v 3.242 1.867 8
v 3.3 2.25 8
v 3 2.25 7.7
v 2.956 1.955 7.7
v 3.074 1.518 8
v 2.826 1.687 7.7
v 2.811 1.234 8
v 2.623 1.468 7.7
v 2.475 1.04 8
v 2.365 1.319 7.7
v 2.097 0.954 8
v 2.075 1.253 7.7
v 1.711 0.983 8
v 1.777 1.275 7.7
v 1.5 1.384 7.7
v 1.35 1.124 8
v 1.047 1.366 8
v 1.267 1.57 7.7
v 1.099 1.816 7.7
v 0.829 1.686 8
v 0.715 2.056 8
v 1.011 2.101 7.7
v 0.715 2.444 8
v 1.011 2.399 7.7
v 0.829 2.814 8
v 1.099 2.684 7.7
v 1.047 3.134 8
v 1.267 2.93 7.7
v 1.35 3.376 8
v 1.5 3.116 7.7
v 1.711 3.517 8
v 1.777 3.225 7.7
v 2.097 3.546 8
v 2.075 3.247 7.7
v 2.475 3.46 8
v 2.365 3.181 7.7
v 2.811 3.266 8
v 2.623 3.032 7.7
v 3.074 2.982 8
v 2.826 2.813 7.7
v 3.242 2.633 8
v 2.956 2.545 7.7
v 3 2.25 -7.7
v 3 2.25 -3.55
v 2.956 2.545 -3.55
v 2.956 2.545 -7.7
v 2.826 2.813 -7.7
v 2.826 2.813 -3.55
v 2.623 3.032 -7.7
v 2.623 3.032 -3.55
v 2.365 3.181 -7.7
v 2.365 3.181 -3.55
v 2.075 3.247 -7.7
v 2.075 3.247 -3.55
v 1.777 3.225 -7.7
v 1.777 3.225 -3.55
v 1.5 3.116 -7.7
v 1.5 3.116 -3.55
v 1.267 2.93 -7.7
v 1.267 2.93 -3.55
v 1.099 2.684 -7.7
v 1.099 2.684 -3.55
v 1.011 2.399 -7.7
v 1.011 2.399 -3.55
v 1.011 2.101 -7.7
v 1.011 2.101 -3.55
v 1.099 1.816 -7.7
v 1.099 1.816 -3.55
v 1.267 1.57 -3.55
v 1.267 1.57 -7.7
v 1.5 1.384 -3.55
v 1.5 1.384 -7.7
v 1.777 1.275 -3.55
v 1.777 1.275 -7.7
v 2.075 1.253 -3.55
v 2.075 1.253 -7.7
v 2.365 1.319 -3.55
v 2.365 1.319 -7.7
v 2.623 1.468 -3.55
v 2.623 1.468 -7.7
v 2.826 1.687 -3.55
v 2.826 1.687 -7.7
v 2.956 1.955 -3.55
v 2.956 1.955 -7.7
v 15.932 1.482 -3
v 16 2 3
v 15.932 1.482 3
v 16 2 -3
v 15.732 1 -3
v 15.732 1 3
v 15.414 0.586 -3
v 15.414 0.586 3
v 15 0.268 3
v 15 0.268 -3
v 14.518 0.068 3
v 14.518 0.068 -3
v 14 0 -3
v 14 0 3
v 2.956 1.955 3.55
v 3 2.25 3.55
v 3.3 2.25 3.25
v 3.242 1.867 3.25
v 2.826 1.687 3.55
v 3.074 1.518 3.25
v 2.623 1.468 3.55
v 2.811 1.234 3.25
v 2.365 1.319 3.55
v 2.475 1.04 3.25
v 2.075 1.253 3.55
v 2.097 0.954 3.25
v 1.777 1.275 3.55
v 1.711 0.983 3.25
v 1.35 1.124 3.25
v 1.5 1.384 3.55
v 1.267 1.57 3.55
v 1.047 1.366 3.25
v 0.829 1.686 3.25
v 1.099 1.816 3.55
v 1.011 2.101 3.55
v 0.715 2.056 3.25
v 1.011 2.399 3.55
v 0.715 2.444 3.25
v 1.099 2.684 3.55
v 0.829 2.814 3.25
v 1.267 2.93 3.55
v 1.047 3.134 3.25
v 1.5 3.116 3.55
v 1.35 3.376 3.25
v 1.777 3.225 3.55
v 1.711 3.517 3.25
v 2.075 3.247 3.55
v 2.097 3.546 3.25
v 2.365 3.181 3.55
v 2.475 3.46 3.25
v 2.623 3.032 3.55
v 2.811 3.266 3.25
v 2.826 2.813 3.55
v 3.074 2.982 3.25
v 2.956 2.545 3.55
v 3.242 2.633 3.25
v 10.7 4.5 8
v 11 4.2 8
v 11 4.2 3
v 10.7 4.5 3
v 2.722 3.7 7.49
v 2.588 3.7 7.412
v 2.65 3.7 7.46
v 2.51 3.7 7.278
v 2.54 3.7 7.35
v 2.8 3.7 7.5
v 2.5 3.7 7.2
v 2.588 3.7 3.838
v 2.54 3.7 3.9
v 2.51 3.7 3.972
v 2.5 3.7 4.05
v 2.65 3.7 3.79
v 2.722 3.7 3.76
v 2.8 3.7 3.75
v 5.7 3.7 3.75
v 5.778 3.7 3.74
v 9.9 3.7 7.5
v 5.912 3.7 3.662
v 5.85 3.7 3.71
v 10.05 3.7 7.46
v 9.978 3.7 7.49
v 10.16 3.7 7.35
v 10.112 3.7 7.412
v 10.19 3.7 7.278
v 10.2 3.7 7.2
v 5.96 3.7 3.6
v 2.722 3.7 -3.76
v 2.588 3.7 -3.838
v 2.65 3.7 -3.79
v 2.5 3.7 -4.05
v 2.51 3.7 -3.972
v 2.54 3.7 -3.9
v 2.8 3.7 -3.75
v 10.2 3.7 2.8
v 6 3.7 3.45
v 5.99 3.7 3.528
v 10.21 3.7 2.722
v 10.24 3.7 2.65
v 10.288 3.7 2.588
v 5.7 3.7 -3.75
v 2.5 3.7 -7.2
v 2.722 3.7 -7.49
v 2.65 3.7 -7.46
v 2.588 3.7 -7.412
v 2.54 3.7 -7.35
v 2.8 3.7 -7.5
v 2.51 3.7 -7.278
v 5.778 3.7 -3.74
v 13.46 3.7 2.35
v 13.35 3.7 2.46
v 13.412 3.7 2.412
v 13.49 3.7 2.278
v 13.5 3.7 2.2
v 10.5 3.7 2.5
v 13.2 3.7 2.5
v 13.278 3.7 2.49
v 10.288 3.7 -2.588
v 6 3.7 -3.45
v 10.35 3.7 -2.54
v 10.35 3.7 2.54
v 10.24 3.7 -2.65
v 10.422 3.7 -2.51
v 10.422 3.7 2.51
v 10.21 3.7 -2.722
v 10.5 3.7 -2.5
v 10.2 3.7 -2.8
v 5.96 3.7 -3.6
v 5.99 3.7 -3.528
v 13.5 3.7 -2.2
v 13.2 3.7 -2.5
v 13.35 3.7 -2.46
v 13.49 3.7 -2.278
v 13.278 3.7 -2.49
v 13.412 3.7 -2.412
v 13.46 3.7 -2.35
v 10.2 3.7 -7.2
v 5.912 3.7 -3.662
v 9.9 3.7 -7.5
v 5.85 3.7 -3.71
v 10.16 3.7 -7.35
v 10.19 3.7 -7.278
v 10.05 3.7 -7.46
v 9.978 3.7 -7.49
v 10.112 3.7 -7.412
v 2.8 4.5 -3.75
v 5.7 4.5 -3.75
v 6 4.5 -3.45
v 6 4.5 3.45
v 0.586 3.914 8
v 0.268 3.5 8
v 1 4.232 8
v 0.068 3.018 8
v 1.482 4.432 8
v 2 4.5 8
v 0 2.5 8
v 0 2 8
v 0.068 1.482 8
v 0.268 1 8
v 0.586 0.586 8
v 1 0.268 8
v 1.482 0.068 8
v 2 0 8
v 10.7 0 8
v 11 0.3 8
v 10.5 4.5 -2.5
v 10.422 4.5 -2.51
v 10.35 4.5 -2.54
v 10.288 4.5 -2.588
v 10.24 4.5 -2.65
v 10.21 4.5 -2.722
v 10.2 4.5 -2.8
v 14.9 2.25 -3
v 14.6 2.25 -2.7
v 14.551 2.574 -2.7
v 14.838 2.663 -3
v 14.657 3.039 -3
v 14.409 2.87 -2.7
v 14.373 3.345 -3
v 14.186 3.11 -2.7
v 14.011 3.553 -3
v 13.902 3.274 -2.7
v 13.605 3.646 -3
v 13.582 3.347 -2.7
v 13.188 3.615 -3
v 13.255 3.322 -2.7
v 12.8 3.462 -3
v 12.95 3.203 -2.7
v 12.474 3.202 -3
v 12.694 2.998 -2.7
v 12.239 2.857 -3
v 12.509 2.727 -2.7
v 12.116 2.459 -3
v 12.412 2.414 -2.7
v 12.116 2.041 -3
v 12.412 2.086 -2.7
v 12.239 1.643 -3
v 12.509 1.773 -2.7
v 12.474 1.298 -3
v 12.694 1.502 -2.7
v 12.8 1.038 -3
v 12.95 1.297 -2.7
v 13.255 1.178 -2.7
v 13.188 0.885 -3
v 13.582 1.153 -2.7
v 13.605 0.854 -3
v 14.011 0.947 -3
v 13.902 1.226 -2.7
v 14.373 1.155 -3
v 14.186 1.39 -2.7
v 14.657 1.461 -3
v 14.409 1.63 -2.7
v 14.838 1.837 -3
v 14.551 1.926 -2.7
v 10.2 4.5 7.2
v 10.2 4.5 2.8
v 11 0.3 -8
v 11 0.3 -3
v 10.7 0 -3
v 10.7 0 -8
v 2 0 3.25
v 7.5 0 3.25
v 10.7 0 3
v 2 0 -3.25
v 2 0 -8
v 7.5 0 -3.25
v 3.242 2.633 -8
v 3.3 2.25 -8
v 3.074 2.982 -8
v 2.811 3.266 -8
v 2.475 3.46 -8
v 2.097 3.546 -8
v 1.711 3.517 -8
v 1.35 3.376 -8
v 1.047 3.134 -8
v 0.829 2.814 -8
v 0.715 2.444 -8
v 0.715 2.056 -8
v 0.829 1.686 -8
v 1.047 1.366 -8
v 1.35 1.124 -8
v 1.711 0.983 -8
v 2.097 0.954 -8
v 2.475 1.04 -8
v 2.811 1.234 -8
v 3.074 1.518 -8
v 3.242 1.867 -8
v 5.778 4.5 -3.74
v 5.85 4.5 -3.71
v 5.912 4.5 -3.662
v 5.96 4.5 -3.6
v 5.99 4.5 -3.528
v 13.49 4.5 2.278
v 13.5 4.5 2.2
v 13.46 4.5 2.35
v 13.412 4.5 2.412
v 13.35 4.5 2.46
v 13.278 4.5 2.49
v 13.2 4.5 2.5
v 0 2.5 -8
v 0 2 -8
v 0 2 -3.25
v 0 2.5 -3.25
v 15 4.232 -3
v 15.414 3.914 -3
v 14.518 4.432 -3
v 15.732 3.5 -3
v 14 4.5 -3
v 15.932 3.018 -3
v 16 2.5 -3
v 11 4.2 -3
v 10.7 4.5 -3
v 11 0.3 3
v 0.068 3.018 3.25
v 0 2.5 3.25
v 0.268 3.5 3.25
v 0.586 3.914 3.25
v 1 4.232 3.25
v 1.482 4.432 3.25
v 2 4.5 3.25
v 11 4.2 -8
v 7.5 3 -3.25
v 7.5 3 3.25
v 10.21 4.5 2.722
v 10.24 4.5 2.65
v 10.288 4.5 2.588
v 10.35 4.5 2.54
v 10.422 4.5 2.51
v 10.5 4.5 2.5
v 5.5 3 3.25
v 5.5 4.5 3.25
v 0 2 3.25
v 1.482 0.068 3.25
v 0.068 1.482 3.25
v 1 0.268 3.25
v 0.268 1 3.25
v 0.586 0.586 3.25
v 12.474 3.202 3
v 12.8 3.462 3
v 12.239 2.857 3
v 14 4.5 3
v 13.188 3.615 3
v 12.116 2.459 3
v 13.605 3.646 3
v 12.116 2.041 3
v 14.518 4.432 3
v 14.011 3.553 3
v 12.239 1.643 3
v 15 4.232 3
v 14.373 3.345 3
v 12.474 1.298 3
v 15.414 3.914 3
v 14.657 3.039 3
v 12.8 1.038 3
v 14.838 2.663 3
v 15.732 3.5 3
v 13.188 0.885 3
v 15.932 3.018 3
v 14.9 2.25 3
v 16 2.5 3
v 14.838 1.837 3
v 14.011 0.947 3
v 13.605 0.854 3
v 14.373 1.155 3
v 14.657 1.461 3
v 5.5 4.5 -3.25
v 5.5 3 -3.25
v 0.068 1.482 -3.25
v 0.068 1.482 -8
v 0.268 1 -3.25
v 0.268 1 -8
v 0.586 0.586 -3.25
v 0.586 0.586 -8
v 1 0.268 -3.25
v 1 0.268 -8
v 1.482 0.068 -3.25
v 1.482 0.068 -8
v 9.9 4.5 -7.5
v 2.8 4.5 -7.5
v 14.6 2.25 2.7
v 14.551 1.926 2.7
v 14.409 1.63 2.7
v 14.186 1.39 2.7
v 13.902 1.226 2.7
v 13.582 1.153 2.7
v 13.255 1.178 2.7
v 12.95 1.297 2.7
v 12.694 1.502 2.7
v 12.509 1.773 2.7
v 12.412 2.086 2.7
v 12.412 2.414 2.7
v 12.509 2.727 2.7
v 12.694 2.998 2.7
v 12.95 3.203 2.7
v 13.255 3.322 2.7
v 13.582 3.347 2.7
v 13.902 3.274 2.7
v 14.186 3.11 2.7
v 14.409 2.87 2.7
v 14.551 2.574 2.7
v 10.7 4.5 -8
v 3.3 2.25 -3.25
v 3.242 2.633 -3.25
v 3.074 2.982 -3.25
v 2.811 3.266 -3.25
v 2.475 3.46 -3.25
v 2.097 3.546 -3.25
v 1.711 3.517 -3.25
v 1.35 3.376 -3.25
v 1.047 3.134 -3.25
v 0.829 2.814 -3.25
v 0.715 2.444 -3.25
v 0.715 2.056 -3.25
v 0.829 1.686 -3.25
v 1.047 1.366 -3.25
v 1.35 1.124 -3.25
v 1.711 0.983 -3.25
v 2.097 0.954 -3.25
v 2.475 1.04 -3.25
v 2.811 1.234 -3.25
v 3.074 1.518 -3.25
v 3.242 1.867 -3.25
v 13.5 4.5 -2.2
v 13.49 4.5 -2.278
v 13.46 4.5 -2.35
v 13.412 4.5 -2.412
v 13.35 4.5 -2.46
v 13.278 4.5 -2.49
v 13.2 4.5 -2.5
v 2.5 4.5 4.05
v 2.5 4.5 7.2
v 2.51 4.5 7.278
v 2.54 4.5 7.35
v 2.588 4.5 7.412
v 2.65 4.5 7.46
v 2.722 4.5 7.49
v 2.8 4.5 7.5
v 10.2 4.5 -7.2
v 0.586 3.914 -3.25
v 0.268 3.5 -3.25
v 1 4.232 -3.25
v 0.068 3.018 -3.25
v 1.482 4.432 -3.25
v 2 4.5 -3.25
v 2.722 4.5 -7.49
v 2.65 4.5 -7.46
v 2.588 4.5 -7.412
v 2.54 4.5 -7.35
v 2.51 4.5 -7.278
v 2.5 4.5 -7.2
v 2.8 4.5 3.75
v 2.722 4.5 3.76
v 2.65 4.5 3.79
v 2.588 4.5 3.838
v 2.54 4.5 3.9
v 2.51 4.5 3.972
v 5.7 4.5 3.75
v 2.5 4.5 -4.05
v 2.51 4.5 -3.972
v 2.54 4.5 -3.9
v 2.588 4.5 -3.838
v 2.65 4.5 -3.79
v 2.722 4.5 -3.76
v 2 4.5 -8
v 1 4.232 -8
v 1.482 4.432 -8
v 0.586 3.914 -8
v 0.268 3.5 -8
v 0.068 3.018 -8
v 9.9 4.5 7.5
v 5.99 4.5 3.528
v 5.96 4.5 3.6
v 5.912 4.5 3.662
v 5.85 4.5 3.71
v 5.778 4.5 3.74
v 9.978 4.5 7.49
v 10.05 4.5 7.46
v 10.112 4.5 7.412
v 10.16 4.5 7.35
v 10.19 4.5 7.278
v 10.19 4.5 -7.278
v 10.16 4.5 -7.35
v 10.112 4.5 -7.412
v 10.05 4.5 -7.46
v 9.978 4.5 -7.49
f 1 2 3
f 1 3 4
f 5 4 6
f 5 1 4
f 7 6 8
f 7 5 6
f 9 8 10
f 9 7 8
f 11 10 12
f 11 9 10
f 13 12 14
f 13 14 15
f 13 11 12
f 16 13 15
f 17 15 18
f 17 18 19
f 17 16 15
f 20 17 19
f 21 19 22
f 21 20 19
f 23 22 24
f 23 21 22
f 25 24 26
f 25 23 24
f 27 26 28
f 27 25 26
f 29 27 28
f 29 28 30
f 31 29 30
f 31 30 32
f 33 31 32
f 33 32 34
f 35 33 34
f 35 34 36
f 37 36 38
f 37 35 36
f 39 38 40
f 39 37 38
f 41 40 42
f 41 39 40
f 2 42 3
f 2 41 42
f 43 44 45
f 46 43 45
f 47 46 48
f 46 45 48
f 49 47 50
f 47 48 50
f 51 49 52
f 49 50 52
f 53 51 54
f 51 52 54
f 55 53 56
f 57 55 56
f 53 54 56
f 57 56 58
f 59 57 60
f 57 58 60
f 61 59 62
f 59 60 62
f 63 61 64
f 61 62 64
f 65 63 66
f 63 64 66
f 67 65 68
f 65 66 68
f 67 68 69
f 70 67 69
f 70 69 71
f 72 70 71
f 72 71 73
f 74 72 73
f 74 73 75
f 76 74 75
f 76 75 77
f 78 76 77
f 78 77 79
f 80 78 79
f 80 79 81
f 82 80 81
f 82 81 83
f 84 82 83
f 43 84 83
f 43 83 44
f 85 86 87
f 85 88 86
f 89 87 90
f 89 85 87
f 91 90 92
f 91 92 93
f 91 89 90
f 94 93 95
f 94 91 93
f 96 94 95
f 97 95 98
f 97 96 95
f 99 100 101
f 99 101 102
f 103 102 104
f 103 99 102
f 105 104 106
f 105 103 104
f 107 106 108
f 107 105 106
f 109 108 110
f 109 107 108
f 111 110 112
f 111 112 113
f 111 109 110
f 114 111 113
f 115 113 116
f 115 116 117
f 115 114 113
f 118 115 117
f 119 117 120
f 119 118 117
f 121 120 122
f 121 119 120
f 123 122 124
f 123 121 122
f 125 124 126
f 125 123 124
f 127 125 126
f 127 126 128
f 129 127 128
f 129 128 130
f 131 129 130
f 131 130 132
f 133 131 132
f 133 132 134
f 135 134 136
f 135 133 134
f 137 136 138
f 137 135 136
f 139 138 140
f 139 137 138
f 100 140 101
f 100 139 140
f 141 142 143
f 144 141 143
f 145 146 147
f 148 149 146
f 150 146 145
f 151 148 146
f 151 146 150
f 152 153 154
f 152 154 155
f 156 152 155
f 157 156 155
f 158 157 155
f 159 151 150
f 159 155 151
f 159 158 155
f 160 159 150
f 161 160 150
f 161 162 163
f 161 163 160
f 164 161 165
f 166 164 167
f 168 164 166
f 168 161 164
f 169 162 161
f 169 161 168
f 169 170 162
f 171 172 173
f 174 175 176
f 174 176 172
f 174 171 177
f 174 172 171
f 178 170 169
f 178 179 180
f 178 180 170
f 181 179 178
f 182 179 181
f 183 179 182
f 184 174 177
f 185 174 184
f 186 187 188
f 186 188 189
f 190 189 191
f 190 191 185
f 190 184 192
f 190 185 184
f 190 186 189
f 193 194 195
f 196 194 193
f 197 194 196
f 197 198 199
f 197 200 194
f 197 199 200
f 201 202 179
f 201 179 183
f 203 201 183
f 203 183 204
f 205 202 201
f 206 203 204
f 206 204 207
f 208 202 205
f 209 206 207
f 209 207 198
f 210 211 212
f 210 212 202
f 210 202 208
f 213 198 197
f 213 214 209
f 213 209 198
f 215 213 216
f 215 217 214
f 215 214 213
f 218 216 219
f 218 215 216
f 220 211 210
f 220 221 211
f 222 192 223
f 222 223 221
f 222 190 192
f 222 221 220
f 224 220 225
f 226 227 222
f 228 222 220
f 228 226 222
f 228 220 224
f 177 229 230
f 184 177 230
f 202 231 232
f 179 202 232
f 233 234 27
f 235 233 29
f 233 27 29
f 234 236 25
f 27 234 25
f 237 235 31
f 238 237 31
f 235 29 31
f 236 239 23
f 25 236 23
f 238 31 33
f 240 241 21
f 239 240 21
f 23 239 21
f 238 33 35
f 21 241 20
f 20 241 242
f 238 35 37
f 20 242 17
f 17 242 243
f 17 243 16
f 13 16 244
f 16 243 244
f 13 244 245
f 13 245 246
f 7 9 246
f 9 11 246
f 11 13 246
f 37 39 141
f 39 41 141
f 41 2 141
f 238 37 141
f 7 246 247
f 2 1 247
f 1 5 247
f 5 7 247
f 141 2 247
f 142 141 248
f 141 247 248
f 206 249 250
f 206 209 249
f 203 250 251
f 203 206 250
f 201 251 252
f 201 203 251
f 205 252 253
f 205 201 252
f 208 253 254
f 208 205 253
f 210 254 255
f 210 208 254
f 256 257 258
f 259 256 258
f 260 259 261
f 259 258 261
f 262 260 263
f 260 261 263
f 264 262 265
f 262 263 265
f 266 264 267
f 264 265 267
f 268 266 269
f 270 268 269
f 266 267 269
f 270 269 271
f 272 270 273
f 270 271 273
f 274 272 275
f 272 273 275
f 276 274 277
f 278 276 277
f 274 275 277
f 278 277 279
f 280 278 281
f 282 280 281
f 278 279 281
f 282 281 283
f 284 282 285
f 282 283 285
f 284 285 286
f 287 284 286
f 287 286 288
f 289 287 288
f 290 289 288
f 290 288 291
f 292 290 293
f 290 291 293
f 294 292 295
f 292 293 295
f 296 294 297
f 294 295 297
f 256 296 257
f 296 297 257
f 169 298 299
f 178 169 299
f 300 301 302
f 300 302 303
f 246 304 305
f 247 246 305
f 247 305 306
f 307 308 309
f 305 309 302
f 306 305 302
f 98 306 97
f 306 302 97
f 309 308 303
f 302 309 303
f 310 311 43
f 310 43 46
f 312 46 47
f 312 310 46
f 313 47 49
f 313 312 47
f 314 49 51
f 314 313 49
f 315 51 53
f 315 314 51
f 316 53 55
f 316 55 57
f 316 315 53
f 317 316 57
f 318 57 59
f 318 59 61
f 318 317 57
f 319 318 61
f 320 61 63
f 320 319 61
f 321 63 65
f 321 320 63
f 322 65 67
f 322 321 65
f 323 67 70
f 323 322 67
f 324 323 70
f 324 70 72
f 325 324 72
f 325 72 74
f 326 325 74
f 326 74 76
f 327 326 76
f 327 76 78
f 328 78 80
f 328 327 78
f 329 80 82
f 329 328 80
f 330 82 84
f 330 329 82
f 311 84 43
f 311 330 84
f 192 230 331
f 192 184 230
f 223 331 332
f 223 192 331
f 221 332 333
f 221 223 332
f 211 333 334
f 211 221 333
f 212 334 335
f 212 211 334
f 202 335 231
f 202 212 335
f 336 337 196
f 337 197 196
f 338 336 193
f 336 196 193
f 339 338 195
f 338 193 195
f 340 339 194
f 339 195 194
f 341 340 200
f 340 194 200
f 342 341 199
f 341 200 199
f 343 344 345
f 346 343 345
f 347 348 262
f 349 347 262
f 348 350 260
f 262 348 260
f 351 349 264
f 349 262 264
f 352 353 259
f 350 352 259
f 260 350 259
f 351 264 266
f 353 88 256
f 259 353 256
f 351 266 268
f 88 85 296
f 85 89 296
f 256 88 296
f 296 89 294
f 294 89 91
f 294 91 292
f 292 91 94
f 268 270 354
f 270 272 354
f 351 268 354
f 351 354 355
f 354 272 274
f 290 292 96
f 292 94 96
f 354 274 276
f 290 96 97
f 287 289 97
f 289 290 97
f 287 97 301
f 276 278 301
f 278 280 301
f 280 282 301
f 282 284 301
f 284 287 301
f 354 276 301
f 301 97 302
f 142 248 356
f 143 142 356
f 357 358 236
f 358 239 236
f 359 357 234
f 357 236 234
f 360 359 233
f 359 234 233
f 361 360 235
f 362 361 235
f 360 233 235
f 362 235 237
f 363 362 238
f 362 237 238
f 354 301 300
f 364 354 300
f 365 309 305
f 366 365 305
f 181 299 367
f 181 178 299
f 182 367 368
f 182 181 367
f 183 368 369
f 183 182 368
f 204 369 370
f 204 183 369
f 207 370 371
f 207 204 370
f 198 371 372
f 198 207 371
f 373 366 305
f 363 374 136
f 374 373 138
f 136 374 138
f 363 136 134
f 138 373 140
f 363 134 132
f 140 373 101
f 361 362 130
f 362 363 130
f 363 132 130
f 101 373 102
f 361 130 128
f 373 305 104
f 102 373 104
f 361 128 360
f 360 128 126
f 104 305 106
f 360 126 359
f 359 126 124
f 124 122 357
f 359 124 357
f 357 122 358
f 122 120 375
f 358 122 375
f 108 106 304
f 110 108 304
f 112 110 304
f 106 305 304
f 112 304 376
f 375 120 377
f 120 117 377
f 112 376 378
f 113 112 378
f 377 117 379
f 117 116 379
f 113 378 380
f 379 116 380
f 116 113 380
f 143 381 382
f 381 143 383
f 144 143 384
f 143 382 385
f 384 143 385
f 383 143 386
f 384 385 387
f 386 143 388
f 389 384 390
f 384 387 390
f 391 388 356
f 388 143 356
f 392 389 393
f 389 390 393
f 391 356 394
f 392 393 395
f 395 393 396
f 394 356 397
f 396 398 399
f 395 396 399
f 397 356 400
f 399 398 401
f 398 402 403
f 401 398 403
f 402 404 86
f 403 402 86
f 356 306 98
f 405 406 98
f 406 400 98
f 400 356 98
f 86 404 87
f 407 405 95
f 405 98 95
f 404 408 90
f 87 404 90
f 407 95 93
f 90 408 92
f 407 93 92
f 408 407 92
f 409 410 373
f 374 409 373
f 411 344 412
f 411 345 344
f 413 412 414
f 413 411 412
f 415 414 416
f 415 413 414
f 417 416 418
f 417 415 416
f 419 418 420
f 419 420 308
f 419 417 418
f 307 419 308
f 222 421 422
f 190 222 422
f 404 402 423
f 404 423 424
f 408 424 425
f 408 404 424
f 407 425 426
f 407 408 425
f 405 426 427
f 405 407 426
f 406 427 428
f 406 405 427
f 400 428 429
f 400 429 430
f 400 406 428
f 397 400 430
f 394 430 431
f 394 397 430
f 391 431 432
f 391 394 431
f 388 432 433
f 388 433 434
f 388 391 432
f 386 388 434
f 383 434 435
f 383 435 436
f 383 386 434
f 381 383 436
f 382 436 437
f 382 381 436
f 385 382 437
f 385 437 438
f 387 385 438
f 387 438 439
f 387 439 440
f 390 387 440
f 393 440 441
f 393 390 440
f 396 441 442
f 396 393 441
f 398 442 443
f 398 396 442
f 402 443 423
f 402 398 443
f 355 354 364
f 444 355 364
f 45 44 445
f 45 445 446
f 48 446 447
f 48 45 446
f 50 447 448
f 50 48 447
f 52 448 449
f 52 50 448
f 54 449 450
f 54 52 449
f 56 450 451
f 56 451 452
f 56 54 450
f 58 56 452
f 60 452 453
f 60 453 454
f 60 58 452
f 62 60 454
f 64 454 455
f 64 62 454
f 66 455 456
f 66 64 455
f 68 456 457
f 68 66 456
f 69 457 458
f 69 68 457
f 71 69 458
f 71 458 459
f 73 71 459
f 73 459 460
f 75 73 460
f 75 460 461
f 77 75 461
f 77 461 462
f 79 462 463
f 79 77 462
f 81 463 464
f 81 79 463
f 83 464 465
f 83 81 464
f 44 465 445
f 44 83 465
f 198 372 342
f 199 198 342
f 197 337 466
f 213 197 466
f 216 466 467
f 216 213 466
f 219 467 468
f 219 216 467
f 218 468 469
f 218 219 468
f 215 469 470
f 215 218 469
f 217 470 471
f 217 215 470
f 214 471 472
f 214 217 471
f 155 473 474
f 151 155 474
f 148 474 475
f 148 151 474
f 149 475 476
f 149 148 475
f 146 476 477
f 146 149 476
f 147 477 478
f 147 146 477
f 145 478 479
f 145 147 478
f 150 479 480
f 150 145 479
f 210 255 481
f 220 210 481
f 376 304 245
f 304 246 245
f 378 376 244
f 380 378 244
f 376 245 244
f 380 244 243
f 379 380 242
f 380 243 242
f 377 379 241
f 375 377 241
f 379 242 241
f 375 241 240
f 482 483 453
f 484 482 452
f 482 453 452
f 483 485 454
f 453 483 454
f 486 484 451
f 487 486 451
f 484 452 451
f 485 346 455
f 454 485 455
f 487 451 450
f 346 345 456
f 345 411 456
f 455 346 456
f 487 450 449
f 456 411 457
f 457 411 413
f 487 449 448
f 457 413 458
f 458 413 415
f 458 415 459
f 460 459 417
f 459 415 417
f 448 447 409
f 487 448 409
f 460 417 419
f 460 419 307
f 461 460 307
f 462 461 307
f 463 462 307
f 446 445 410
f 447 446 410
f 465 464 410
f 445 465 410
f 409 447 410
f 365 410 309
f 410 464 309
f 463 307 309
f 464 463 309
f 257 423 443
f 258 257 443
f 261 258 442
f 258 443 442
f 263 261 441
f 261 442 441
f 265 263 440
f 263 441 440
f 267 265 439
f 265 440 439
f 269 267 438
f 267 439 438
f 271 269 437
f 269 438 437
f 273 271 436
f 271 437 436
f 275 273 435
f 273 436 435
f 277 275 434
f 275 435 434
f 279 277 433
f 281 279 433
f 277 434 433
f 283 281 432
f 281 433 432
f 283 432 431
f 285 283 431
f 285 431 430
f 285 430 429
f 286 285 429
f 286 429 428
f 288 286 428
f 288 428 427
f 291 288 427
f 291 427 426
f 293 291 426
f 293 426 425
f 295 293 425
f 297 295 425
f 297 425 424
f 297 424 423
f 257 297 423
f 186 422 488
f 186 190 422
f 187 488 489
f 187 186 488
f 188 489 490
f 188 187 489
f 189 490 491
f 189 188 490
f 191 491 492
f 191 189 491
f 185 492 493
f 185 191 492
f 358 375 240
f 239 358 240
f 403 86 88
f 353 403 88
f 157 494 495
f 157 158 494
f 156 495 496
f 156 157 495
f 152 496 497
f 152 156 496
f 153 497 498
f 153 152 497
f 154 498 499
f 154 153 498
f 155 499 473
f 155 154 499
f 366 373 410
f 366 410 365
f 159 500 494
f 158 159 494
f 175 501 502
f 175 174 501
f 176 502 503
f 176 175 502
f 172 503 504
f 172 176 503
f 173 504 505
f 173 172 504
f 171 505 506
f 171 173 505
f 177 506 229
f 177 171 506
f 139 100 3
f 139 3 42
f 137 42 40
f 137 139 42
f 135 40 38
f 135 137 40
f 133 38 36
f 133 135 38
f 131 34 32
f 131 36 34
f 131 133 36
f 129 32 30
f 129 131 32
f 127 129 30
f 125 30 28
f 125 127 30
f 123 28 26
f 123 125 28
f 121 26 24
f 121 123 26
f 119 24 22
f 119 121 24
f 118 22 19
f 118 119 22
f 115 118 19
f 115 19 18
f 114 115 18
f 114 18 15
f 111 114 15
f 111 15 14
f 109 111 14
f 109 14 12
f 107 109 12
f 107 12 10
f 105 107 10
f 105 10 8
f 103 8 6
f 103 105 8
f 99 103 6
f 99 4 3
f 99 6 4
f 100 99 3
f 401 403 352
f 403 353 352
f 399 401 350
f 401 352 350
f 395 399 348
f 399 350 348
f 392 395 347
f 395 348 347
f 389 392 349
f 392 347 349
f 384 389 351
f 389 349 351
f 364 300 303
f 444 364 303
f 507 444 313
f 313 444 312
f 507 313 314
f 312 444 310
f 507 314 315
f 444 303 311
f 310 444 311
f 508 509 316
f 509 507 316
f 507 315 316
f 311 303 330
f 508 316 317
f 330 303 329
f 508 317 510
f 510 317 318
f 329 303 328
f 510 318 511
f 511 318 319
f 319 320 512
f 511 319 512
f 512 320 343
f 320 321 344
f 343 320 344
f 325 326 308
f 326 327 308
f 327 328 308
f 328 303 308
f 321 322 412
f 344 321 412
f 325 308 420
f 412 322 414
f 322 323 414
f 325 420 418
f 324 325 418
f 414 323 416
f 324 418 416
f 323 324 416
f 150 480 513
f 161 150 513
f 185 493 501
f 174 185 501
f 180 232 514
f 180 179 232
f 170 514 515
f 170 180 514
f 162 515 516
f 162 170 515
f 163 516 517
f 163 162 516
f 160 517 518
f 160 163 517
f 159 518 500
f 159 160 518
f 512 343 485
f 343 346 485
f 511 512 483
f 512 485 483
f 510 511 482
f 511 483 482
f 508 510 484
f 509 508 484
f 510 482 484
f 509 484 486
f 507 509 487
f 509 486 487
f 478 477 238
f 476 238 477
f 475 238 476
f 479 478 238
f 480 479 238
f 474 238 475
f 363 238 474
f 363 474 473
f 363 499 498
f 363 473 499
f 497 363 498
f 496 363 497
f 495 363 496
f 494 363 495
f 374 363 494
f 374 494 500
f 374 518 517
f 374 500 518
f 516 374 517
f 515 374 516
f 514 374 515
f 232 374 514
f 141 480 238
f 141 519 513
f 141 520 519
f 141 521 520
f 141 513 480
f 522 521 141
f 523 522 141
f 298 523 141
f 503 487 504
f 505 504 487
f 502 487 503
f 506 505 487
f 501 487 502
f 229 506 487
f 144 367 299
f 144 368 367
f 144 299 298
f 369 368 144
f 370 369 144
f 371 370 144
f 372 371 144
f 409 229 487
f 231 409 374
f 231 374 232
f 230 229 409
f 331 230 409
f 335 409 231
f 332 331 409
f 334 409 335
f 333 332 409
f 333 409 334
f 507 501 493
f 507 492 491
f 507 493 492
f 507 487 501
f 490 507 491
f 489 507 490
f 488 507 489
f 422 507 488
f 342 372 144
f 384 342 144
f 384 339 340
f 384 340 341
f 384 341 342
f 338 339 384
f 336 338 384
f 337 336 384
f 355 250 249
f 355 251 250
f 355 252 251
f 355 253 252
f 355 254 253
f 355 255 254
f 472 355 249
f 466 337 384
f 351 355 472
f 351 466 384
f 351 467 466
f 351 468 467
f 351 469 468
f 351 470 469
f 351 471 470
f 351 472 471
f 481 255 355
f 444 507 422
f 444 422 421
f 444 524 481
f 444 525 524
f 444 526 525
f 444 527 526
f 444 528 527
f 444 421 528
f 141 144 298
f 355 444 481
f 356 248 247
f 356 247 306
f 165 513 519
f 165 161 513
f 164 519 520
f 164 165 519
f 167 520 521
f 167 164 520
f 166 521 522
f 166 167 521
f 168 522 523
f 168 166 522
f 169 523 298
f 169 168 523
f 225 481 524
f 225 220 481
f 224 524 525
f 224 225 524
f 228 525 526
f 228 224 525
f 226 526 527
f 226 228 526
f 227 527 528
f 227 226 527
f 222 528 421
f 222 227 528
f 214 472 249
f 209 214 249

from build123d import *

# Parameters (mm, degrees)
GRUNDK_RPER_DEPTH         = 4.5
SKIZZE2_R                 = 1
SKIZZE2_R_2               = 1.1
ACHSBOHHRUNGEN_DEPTH      = 9
ACHSBOHHRUNGEN_DEPTH_BACK = 9
SKIZZE3_W                 = 2
SKIZZE3_H                 = 6.5
AUSSCHNITT_ZAHN_DEPTH     = 3
VERRUNDUNG2_R             = 2
FASE1_SIZE                = 0.3
FASE2_SIZE                = 0.3
MOOSGUMMIVERTIEFUNG_DEPTH = 0.8
VERRUNDUNG8_R             = 0.3


with BuildPart() as part:
    # Skizze1 → Grundkörper (new body)
    with BuildSketch(Plane(origin=(0, 0, 0), x_dir=(1, 0, 0), z_dir=(0, 1, 0))):
        Polygon((5.5, 3.25), (5.5, -3.25), (0, -3.25), (0, -8), (11, -8), (11, -3), (16, -3), (16, 3), (11, 3), (11, 8), (0, 8), (0, 3.25), align=None)
    extrude(amount=GRUNDK_RPER_DEPTH)

    # Skizze2 → Achsbohhrungen (cut, two sides)
    with BuildSketch(Plane.XY) as achsbohhrungen_sk:
        with Locations((2, 2.25)):
            Circle(SKIZZE2_R)
        with Locations((13.5, 2.25)):
            Circle(SKIZZE2_R_2)
    extrude(amount=ACHSBOHHRUNGEN_DEPTH, mode=Mode.SUBTRACT)
    extrude(achsbohhrungen_sk.sketch, amount=-ACHSBOHHRUNGEN_DEPTH_BACK, mode=Mode.SUBTRACT)

    # Skizze3 → Ausschnitt Zahn (cut)
    with BuildSketch(Plane.XZ):
        with Locations((6.5, 0)):
            Rectangle(SKIZZE3_W, SKIZZE3_H)
    extrude(amount=-AUSSCHNITT_ZAHN_DEPTH, mode=Mode.SUBTRACT)

    # Verrundung2
    verrundung2_edges = [part.edges().sort_by_distance(p)[0] for p in [
        (0, 0, -5.625),
        (16, 0, 0),
        (0, 0, 5.625),
        (16, 4.5, 0),
        (0, 4.5, -5.625),
        (0, 4.5, 5.625),
    ]]
    fillet(verrundung2_edges, radius=VERRUNDUNG2_R)

    # Fase1
    fase1_edges = [part.edges().sort_by_distance(p)[0] for p in [
        (11, 0, -5.5),
        (11, 4.5, 5.5),
        (11, 0, 5.5),
        (11, 4.5, -5.5),
    ]]
    chamfer(fase1_edges, length=FASE1_SIZE)

    # Fase2
    fase2_edges = [part.edges().sort_by_distance(p)[0] for p in [
        (1, 2.25, 3.25),
        (1, 2.25, -8),
        (1, 2.25, -3.25),
        (1, 2.25, 8),
        (12.4, 2.25, -3),
        (12.4, 2.25, 3),
    ]]
    chamfer(fase2_edges, length=FASE2_SIZE)

    # Skizze6 → MoosgummiVertiefung (cut)
    with BuildSketch(Plane(origin=(0, 4.5, 0), x_dir=(1, 0, 0), z_dir=(0, 1, 0))):
        Polygon((13.5, -2.5), (13.5, 2.5), (10.2, 2.5), (10.2, 7.5), (2.5, 7.5), (2.5, 3.75), (6, 3.75), (6, -3.75), (2.5, -3.75), (2.5, -7.5), (10.2, -7.5), (10.2, -2.5), align=None)
    extrude(amount=-MOOSGUMMIVERTIEFUNG_DEPTH, mode=Mode.SUBTRACT)

    # Verrundung8
    verrundung8_edges = [part.edges().sort_by_distance(p)[0] for p in [
        (13.5, 4.1, 2.5),
        (10.2, 4.1, 2.5),
        (10.2, 4.1, 7.5),
        (2.5, 4.1, 7.5),
        (2.5, 4.1, 3.75),
        (6, 4.1, 3.75),
        (6, 4.1, -3.75),
        (2.5, 4.1, -3.75),
        (2.5, 4.1, -7.5),
        (10.2, 4.1, -7.5),
        (10.2, 4.1, -2.5),
        (13.5, 4.1, -2.5),
    ]]
    fillet(verrundung8_edges, radius=VERRUNDUNG8_R)


solid = part.part
